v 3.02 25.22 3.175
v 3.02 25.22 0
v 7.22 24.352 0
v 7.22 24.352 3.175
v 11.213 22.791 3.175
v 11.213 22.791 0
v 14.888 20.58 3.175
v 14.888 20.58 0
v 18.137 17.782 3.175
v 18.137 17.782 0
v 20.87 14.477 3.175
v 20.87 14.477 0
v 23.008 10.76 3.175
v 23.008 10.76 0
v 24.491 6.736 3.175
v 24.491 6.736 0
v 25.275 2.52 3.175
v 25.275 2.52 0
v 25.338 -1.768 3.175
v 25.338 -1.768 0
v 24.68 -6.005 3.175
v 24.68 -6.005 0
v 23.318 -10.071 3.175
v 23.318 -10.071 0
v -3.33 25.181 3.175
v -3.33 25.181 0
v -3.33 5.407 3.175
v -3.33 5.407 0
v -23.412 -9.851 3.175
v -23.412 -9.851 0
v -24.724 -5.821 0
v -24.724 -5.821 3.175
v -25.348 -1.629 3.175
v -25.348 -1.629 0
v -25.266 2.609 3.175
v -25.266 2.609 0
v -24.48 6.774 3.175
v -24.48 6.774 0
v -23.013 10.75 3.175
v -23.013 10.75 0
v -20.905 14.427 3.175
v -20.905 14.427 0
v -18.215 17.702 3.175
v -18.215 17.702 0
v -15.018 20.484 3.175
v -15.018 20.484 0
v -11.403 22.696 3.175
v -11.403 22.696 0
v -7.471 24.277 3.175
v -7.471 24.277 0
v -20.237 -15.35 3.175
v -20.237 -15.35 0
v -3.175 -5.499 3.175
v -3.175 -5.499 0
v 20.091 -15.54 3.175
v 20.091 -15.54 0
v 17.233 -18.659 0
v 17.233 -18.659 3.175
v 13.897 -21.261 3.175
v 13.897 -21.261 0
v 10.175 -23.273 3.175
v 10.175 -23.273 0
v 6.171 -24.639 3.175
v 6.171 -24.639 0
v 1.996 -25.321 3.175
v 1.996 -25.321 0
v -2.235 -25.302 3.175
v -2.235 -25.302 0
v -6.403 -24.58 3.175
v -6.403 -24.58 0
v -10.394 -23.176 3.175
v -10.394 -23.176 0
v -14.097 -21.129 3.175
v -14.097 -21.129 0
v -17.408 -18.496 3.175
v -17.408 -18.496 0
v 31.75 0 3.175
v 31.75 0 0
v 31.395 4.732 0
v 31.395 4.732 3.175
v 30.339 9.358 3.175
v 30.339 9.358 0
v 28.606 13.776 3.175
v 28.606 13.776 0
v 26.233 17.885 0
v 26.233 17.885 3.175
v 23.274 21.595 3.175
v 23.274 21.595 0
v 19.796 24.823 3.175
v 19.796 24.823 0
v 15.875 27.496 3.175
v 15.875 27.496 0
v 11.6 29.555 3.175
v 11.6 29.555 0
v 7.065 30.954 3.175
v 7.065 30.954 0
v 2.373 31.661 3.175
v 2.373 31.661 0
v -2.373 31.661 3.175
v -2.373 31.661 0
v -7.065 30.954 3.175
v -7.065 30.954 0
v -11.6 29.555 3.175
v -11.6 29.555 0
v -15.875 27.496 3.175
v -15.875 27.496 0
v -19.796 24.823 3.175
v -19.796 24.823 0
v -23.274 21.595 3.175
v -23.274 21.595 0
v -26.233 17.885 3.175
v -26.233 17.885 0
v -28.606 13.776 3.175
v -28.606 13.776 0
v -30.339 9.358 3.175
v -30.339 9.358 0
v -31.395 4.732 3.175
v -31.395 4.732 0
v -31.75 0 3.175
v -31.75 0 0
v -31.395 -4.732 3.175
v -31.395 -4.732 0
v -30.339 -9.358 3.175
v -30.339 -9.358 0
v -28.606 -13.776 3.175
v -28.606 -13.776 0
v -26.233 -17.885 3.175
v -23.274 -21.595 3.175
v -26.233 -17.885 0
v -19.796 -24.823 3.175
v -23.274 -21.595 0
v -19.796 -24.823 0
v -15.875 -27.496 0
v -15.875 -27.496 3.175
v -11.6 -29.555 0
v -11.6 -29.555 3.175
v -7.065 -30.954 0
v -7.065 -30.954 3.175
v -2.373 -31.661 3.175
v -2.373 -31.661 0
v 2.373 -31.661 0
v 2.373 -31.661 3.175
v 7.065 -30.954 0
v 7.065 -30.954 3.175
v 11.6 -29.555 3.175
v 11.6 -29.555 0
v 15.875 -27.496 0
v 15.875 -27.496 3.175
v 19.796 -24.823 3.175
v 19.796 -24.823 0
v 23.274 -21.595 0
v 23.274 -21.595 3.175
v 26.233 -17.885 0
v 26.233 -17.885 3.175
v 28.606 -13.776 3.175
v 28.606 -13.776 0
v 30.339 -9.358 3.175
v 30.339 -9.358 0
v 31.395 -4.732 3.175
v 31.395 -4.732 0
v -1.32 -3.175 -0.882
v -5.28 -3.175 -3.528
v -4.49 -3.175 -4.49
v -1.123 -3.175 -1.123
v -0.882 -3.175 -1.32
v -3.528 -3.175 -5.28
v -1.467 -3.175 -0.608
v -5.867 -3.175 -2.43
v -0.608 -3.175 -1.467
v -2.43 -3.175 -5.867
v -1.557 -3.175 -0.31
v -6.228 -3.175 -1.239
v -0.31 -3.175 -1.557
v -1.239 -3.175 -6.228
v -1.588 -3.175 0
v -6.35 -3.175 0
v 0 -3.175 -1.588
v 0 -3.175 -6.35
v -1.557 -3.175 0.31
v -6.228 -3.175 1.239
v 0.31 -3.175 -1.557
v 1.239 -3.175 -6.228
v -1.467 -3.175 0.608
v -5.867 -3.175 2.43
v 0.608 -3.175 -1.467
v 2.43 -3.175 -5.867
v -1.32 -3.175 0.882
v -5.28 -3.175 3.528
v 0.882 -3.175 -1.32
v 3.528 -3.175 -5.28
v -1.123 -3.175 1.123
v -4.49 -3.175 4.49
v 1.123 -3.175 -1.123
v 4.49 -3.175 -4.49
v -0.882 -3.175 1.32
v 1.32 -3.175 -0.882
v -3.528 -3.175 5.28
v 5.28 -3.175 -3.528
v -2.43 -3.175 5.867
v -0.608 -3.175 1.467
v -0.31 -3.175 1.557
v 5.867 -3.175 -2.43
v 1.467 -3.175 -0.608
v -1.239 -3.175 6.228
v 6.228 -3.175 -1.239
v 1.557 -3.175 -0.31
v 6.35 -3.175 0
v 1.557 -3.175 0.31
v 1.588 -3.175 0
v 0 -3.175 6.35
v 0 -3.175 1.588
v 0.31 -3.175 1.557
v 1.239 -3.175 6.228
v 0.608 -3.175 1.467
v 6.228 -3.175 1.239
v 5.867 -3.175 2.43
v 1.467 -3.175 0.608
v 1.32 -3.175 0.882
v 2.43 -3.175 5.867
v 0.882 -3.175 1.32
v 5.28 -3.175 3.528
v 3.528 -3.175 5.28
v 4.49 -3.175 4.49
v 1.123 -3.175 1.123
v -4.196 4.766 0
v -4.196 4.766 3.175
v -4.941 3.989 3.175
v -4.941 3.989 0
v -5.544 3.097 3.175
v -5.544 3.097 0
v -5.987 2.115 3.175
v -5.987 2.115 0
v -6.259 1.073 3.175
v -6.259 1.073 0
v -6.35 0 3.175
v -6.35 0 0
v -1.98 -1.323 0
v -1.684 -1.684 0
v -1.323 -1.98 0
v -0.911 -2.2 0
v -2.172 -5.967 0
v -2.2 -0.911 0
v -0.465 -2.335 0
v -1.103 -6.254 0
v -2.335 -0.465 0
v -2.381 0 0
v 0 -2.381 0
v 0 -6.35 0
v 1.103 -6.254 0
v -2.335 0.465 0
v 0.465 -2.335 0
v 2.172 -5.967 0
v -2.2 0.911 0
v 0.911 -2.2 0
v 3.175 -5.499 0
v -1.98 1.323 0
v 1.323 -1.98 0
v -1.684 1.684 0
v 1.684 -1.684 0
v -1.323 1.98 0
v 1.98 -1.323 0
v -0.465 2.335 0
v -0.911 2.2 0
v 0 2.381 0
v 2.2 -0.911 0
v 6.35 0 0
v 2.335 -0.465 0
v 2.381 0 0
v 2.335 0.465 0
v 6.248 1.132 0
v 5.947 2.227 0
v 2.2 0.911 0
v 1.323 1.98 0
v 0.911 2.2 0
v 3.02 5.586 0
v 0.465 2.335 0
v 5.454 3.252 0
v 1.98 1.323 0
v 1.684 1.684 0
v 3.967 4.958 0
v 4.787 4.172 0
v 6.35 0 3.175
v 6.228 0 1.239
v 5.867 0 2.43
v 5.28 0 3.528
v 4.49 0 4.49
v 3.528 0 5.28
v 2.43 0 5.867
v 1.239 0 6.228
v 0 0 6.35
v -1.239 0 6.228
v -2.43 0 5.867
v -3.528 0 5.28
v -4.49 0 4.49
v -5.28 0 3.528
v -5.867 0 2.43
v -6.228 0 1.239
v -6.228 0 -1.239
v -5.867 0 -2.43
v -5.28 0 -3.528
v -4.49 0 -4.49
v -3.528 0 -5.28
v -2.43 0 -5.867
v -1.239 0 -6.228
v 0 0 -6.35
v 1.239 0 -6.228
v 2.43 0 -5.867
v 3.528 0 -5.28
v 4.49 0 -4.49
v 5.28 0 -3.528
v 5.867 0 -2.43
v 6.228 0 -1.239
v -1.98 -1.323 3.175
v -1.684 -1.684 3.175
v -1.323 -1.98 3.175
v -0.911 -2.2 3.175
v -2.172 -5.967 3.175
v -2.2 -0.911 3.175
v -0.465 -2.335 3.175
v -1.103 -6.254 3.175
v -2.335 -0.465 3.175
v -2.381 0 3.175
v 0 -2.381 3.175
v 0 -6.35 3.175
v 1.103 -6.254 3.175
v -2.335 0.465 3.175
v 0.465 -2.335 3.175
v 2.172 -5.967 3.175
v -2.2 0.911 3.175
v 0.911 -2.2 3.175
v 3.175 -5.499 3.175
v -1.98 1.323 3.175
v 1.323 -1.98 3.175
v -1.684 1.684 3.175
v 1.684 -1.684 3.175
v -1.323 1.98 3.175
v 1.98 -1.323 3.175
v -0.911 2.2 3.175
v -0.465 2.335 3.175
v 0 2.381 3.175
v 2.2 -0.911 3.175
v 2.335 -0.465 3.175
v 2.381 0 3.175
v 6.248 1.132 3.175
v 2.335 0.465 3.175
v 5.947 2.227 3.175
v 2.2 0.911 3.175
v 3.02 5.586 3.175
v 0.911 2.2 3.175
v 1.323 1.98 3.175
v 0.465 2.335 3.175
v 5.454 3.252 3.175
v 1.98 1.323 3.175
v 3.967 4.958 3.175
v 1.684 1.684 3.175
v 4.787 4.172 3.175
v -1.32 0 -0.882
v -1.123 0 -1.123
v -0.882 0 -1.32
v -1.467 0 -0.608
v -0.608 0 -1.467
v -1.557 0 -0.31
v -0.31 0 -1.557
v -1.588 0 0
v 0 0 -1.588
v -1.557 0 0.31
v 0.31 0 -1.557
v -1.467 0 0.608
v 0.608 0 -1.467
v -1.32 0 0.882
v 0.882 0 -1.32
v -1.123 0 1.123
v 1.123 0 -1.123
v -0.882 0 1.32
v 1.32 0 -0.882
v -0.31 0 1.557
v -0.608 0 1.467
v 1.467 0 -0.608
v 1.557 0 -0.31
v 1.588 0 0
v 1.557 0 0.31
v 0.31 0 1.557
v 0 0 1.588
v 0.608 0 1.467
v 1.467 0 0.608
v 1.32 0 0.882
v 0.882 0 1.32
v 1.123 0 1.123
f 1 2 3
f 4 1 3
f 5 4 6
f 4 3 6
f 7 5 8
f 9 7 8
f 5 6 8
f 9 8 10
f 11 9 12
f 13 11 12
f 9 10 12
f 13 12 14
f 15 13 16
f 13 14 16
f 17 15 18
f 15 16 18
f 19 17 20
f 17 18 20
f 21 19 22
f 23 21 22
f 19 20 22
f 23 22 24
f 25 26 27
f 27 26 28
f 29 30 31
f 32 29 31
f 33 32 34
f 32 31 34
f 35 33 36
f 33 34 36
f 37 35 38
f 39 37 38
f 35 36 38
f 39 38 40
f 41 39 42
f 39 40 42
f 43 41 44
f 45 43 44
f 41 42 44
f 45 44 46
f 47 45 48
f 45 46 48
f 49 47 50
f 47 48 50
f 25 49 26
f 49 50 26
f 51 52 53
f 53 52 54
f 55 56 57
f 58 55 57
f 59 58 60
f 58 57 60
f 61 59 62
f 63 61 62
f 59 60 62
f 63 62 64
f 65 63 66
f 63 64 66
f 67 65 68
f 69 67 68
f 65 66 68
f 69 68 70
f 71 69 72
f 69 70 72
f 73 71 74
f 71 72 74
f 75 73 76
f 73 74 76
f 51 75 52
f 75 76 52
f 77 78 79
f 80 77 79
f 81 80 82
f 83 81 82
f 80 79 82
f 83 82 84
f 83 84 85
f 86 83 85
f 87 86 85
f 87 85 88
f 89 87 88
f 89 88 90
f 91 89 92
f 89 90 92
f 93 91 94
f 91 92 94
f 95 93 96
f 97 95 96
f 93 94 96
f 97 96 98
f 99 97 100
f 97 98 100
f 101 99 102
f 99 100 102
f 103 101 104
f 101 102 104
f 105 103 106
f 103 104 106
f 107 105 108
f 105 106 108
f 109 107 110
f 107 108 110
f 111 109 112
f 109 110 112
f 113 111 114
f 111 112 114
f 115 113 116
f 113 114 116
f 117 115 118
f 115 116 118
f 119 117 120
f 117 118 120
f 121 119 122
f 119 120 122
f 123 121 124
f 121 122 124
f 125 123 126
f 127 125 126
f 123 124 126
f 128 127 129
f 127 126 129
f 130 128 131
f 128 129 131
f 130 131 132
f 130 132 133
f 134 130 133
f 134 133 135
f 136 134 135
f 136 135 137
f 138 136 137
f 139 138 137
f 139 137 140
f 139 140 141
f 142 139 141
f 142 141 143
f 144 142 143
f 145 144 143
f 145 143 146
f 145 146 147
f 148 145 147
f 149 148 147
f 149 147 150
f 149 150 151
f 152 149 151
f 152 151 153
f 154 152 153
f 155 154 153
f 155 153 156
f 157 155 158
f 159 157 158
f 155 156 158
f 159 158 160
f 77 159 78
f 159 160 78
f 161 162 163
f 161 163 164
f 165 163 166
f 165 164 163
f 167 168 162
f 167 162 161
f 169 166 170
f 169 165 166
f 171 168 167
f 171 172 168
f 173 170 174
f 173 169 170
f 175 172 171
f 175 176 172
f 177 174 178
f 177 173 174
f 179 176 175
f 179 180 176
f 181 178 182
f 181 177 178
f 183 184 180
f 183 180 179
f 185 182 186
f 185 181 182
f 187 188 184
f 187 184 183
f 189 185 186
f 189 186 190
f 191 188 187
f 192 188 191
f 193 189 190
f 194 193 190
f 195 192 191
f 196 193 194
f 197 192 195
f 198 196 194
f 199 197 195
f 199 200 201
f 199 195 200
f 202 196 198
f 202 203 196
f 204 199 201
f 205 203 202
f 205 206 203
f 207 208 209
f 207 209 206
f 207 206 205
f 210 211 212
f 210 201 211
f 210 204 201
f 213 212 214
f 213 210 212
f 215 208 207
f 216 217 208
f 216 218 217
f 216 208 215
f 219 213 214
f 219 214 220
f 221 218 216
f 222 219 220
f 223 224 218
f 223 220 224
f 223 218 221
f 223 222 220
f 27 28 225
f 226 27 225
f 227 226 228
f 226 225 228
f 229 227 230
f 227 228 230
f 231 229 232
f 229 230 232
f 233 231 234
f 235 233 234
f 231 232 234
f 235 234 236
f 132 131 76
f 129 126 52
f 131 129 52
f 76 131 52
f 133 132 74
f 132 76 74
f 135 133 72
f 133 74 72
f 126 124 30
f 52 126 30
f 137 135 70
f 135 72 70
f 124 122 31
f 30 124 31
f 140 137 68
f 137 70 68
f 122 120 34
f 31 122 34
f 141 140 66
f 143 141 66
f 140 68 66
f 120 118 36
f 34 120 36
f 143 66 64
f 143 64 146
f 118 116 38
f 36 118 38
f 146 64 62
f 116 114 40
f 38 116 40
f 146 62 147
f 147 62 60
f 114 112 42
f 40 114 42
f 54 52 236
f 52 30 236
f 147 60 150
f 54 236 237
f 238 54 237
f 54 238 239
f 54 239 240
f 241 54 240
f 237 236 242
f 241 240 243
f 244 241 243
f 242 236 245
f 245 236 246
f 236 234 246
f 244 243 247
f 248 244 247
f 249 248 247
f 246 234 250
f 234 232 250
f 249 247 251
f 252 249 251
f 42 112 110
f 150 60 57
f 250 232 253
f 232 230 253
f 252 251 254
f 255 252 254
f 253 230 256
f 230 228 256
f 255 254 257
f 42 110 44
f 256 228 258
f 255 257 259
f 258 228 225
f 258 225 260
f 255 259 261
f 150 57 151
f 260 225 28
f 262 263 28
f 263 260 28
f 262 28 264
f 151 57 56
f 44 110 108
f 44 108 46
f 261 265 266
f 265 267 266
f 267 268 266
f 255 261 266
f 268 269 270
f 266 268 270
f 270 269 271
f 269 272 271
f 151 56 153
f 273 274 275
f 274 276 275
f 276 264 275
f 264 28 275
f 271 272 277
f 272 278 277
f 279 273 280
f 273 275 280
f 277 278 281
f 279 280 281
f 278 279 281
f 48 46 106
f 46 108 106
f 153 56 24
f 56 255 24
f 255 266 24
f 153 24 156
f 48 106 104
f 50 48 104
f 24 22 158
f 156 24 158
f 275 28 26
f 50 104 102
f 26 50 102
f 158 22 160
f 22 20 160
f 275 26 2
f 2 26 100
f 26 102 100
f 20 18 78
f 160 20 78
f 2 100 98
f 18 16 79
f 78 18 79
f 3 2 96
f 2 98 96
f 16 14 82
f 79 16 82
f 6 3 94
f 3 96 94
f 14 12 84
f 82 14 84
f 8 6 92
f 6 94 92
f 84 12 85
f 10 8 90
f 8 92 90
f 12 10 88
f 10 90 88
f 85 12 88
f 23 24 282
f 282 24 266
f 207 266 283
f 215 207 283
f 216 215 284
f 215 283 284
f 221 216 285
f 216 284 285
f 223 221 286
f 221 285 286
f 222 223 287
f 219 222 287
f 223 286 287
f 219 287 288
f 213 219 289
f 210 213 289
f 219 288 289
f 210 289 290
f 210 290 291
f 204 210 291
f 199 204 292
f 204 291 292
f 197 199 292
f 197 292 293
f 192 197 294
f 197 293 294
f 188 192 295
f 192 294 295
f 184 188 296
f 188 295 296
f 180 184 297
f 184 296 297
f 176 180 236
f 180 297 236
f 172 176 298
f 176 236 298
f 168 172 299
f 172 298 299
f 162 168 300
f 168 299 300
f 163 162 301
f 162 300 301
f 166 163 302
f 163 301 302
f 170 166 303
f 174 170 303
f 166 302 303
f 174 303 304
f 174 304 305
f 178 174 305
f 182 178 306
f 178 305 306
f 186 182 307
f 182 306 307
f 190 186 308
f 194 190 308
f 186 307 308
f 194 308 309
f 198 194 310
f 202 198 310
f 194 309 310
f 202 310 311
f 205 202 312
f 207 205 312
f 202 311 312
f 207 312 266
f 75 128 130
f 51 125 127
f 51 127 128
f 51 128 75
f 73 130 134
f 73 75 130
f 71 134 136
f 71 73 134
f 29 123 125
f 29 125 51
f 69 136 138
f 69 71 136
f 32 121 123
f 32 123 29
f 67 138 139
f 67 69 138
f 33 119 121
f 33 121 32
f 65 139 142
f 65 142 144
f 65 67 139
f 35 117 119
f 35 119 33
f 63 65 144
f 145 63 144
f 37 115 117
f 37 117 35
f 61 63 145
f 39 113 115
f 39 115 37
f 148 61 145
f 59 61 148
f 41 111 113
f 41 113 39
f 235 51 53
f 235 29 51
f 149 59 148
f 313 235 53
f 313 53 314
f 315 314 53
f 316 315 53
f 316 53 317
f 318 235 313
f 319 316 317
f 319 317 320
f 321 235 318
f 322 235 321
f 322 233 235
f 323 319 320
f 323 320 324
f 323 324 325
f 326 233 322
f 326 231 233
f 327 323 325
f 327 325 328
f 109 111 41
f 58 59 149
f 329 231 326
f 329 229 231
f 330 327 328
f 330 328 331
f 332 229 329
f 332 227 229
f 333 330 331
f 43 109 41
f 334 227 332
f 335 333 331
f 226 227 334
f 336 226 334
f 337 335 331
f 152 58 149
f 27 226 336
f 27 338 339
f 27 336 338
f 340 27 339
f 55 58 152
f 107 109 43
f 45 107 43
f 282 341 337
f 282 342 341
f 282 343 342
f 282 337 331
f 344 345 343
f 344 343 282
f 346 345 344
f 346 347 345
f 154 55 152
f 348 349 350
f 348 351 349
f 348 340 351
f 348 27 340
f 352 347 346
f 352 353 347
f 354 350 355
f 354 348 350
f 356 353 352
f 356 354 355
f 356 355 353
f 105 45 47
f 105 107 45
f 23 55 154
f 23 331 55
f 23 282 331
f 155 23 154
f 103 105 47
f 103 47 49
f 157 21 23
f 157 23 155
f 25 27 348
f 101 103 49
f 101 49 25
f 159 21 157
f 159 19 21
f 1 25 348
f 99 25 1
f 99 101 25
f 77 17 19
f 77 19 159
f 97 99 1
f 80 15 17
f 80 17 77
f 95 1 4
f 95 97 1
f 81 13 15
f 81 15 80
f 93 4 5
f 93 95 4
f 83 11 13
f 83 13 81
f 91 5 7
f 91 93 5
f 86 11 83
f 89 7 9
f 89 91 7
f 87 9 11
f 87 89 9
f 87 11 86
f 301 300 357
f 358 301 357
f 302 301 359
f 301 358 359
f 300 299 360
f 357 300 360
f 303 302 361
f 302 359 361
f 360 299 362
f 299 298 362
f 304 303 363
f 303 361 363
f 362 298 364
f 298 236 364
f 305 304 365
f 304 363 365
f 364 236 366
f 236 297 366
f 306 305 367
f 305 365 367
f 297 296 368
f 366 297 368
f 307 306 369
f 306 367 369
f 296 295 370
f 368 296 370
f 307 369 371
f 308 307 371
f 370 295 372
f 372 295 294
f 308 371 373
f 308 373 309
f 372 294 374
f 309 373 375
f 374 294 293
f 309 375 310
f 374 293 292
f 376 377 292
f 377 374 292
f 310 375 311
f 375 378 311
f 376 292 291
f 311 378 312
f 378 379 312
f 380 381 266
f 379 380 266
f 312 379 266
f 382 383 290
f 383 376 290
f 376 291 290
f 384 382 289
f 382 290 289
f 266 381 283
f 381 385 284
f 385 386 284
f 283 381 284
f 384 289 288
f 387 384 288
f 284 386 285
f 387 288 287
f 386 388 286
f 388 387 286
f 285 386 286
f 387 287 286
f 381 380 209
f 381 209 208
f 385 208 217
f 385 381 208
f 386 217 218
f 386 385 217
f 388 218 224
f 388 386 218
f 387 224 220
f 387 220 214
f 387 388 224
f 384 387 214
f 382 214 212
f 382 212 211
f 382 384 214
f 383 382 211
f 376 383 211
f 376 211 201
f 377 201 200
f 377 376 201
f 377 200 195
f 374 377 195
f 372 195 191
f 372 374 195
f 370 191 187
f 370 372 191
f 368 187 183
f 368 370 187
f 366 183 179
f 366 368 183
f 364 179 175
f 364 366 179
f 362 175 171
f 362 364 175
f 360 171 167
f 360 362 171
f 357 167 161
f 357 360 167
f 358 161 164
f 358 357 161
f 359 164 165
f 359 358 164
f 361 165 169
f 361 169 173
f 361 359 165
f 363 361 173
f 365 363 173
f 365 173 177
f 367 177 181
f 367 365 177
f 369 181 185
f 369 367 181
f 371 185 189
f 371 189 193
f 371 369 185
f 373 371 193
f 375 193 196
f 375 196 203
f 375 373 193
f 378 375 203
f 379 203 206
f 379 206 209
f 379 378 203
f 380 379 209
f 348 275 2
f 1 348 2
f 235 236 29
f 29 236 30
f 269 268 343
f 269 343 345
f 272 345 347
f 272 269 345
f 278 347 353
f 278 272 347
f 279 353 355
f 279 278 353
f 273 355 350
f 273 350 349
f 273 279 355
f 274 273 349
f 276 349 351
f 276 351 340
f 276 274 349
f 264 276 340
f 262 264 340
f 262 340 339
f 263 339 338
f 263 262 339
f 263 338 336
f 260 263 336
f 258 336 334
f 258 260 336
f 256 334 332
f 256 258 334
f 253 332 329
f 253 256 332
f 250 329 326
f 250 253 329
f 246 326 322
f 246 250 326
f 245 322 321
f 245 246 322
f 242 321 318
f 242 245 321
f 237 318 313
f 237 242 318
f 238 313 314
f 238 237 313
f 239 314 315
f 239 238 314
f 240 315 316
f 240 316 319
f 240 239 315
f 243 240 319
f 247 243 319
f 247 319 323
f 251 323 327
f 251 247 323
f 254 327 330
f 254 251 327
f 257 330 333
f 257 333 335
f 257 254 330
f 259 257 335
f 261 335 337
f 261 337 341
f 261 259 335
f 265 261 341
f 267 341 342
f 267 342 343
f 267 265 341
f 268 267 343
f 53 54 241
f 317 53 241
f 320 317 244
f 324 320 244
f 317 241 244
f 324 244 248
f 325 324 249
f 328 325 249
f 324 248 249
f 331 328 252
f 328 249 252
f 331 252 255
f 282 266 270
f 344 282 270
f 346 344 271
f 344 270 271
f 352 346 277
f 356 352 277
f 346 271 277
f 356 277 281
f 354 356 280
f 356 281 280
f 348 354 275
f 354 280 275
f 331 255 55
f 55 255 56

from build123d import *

# Parameters (mm, degrees)
F0_R     = 31.75
F0_R_2   = 2.38125
F1_DEPTH = 3.175
F2_R     = 6.35
F2_R_2   = 1.5875
F3_DEPTH = 3.175


with BuildPart() as f1:
    # F0 (on Top) → F1 (new body)
    with BuildSketch(Plane.XY):
        Circle(F0_R)
        with BuildLine():
            ThreePointArc((20.091456, -15.540058), (-0.119689, -25.399718), (-20.237017, -15.350021))
            Line((-20.237017, -15.350021), (-3.175, -5.499261))
            ThreePointArc((-3.175, -5.499261), (0, -6.35), (3.175, -5.499261))
            Line((3.175, -5.499261), (20.091456, -15.540058))
        make_face(mode=Mode.SUBTRACT)
        with BuildLine():
            Line((-3.329914, 25.18078), (-3.329914, 5.406864))
            ThreePointArc((-3.329914, 5.406864), (-5.543801, 3.096575), (-6.35, 0))
            Line((-6.35, 0), (-23.412017, -9.85076))
            ThreePointArc((-23.412017, -9.85076), (-22.035991, 12.632304), (-3.329914, 25.18078))
        make_face(mode=Mode.SUBTRACT)
        Circle(F0_R_2, mode=Mode.SUBTRACT)
        with BuildLine():
            Line((3.020086, 5.585837), (3.020086, 25.219815))
            ThreePointArc((3.020086, 25.219815), (22.017951, 12.66372), (23.317965, -10.07137))
            Line((23.317965, -10.07137), (6.35, 0))
            ThreePointArc((6.35, 0), (5.454358, 3.251534), (3.020086, 5.585837))
        make_face(mode=Mode.SUBTRACT)
    extrude(amount=F1_DEPTH)


with BuildPart() as f3:
    # F2 (on Front) → F3 (new body)
    with BuildSketch(Plane.XZ):
        Circle(F2_R)
        Circle(F2_R_2, mode=Mode.SUBTRACT)
    extrude(amount=F3_DEPTH)


solid = Compound([f1.part, f3.part])
